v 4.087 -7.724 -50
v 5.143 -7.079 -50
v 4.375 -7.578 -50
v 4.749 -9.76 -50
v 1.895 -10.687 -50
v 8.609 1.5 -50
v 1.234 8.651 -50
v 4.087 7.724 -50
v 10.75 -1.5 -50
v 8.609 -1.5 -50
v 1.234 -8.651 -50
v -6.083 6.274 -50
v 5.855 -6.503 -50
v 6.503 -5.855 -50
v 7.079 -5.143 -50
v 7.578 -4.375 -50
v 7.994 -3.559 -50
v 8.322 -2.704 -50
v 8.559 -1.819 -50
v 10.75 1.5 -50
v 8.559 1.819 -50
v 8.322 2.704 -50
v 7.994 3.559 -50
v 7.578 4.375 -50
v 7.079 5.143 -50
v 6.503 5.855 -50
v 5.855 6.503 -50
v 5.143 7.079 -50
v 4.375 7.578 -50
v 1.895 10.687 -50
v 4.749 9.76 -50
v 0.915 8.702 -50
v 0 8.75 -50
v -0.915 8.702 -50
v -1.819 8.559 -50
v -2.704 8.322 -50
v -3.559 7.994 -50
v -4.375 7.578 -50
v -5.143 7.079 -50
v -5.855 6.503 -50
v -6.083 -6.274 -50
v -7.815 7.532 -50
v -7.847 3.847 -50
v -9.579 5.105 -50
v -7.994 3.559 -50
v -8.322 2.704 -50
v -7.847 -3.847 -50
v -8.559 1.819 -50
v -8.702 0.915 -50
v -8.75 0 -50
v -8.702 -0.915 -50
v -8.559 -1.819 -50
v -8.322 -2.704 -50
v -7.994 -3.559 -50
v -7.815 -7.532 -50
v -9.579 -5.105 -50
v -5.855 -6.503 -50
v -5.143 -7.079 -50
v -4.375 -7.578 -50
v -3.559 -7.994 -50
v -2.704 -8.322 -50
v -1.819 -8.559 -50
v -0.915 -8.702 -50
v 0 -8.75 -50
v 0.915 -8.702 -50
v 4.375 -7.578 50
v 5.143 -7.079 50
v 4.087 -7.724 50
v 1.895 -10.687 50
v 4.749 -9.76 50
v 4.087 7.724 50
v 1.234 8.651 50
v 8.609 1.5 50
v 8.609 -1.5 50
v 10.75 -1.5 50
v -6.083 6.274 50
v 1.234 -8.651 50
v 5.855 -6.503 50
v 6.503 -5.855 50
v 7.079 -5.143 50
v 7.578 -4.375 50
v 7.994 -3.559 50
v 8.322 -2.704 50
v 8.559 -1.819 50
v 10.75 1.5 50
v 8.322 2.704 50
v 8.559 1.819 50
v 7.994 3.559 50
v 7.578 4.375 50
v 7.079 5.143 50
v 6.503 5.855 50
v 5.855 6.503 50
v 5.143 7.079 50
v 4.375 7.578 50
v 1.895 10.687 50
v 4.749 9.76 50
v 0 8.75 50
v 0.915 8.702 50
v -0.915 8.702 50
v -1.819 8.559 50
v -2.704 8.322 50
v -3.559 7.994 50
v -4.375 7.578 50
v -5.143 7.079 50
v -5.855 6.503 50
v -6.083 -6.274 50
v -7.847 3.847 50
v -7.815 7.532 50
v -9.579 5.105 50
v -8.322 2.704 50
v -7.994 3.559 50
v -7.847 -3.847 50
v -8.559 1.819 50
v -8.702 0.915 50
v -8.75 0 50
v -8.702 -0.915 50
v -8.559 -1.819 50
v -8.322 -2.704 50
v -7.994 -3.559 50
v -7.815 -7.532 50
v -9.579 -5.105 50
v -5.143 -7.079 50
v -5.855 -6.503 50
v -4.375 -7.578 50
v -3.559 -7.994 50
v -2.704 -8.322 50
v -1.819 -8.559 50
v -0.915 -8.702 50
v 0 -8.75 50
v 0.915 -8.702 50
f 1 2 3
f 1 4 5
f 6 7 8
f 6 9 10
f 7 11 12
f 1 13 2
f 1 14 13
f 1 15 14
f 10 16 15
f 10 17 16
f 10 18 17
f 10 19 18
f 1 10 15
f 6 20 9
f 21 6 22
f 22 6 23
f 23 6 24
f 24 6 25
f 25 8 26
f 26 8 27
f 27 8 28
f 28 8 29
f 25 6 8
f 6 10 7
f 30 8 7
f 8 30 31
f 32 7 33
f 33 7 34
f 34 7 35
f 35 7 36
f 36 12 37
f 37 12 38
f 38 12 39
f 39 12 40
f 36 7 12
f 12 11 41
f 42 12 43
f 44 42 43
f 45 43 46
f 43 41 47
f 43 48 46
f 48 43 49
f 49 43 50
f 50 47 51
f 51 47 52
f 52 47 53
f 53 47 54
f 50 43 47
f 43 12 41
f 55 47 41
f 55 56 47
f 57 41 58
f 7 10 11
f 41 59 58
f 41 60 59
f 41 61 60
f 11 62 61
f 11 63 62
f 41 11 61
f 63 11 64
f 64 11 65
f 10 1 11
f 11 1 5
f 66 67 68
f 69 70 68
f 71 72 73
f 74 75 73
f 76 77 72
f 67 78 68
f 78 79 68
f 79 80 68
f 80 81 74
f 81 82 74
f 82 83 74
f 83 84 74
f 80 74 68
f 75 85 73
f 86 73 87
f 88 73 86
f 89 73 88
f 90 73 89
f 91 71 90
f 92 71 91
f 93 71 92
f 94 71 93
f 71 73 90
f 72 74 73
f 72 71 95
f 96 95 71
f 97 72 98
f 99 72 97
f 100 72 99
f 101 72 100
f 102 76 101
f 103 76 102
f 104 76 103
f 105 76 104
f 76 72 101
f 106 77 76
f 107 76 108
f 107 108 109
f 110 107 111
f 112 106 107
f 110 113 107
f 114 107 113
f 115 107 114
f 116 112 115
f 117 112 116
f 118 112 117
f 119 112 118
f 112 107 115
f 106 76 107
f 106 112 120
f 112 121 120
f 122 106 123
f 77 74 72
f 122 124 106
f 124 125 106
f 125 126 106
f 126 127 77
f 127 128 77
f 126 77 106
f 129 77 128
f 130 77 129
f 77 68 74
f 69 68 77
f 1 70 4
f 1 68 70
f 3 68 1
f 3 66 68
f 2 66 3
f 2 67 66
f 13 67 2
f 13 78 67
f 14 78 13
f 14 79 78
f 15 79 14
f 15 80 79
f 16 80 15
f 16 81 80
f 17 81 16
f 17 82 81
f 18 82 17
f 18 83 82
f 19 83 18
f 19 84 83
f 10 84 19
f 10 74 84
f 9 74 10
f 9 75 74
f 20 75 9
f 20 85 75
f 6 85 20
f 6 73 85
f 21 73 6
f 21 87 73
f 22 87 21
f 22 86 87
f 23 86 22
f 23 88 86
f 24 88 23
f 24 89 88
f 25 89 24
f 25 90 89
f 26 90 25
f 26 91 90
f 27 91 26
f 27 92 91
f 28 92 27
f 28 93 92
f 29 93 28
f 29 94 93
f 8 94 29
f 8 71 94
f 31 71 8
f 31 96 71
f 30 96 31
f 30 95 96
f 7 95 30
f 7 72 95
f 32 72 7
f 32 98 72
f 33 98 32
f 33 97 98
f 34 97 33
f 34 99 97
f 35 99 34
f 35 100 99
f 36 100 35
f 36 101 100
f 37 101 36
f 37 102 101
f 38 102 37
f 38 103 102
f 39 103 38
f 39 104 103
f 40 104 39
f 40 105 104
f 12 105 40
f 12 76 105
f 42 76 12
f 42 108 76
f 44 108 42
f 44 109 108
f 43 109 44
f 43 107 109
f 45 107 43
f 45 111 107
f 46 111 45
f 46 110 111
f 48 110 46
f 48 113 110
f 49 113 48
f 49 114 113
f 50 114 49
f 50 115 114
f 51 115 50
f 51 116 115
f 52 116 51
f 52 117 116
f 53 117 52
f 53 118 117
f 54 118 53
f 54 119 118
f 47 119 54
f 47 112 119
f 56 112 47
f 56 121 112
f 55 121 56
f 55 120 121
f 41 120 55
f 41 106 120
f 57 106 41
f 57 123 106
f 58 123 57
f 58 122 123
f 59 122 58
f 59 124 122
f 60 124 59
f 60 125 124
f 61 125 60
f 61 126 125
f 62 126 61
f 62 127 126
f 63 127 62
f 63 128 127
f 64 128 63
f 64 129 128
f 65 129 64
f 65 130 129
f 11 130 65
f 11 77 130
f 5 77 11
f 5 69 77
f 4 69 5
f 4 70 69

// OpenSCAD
// [ "Standard_Name", _num_teeth, _tooth_width ]
_spline_standards = [
    ["ANSI_A", 6, 2.0],
    ["ANSI_B", 8, 3.0],
    ["ISO_1", 12, 1.5],
    ["ISO_2", 5, 3.0]
];

// [ Load_kg, _base_radius ]
_load_table = [
    [10, 5.0],
    [50, 10.0],
    [100, 18.0]
];

module smart_spline(standard, load, length)
{
    assert(length > 0, "Negative input");
    // assert(standard == "ANSI_A" || standard == "ANSI_B" || standard == "ISO_1", "Not a standard");
    assert(load > 10 && load < 100, "Load limited to [10,100]"); // i chose this so we can interpolate, i don't know if exrapolation is possible but this is safer.

    index = search([standard], _spline_standards);
    assert(len(index) > 0, "Standard not found in database!");

    _num_teeth = _spline_standards[index[0]][1];
    _tooth_width = _spline_standards[index[0]][2];

    _base_radius = lookup(load, _load_table);


    linear_extrude(height=length, center=true) 
    {
        // shaft
        circle(r=_base_radius, $fn=60);

        // teeth, i chose the half so we don't have duplicates
        _angle_inc = 360 / _num_teeth;
        _is_odd = _num_teeth % 2;
        
        
        _tooth_length = (_is_odd) ? 4 : 2 * (_base_radius + 2); // twice the teeth height
        _interval = (_is_odd) ? _num_teeth - 1 : (_num_teeth)/2 - 1;
        _tr = (_is_odd) ? _base_radius : 0;

        for (i=[0:_interval]) 
        {
            _angle = i * _angle_inc;

            rotate([0,0,_angle])
            translate([_tr, 0])
            square(size=[_tooth_length, _tooth_width], center=true);
        }
    }

}

smart_spline("ISO_2", 40, 100);
